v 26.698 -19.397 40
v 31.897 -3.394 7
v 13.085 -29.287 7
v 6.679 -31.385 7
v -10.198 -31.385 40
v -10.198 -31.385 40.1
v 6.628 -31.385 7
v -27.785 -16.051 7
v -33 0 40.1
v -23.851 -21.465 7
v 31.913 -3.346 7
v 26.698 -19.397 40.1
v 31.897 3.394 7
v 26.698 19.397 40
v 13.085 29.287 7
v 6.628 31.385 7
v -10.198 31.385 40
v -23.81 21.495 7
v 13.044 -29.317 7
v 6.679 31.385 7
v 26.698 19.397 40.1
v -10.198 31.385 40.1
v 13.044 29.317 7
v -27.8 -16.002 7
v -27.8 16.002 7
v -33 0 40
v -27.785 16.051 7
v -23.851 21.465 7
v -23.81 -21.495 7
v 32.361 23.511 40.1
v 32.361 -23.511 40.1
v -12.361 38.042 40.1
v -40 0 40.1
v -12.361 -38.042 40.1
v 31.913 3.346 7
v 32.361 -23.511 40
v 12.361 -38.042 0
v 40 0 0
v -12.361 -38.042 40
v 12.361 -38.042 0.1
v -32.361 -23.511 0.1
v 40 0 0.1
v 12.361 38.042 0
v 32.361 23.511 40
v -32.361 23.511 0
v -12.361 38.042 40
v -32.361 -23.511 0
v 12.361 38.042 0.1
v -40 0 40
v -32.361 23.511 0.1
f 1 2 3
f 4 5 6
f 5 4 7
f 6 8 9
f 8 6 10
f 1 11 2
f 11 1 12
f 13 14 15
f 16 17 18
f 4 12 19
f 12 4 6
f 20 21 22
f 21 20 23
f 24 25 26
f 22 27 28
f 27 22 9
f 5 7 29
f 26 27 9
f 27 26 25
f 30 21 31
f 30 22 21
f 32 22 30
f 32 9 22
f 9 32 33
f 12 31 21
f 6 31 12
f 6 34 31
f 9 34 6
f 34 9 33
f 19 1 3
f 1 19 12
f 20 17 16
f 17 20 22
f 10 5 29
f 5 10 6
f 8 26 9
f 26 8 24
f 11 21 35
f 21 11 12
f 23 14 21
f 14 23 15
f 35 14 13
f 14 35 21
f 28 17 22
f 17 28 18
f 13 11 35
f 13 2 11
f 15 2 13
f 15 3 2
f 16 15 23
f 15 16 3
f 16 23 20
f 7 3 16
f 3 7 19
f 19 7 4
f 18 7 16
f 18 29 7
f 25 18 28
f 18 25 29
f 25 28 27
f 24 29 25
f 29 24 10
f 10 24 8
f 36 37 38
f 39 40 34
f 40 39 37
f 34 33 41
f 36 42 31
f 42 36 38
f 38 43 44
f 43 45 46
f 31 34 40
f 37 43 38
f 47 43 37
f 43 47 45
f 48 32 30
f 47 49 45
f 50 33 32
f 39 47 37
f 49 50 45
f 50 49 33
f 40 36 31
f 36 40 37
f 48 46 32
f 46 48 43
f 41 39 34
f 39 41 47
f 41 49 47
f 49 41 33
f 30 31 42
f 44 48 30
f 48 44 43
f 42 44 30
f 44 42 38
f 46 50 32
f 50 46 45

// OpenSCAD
outer_radius = 40;
height = outer_radius;
polygon_degree = 5;
thickness = 7;

module polygon_extrusion (height, degree, radius)
{
  hull () {
    linear_extrude (0.1)
      circle (radius, $fn=degree);
    translate ([0,0,height])
      linear_extrude (0.1)
        rotate ([0,0,180/polygon_degree])
          circle (radius, $fn=degree);
  }
}

linear_extrude (3) circle (3);

difference () {
  polygon_extrusion (
    height,
    polygon_degree,
    outer_radius);
  difference () {
    polygon_extrusion (
      height,
      polygon_degree,
      outer_radius - thickness);
    linear_extrude (thickness)
      circle (outer_radius * 2);
  }
}
